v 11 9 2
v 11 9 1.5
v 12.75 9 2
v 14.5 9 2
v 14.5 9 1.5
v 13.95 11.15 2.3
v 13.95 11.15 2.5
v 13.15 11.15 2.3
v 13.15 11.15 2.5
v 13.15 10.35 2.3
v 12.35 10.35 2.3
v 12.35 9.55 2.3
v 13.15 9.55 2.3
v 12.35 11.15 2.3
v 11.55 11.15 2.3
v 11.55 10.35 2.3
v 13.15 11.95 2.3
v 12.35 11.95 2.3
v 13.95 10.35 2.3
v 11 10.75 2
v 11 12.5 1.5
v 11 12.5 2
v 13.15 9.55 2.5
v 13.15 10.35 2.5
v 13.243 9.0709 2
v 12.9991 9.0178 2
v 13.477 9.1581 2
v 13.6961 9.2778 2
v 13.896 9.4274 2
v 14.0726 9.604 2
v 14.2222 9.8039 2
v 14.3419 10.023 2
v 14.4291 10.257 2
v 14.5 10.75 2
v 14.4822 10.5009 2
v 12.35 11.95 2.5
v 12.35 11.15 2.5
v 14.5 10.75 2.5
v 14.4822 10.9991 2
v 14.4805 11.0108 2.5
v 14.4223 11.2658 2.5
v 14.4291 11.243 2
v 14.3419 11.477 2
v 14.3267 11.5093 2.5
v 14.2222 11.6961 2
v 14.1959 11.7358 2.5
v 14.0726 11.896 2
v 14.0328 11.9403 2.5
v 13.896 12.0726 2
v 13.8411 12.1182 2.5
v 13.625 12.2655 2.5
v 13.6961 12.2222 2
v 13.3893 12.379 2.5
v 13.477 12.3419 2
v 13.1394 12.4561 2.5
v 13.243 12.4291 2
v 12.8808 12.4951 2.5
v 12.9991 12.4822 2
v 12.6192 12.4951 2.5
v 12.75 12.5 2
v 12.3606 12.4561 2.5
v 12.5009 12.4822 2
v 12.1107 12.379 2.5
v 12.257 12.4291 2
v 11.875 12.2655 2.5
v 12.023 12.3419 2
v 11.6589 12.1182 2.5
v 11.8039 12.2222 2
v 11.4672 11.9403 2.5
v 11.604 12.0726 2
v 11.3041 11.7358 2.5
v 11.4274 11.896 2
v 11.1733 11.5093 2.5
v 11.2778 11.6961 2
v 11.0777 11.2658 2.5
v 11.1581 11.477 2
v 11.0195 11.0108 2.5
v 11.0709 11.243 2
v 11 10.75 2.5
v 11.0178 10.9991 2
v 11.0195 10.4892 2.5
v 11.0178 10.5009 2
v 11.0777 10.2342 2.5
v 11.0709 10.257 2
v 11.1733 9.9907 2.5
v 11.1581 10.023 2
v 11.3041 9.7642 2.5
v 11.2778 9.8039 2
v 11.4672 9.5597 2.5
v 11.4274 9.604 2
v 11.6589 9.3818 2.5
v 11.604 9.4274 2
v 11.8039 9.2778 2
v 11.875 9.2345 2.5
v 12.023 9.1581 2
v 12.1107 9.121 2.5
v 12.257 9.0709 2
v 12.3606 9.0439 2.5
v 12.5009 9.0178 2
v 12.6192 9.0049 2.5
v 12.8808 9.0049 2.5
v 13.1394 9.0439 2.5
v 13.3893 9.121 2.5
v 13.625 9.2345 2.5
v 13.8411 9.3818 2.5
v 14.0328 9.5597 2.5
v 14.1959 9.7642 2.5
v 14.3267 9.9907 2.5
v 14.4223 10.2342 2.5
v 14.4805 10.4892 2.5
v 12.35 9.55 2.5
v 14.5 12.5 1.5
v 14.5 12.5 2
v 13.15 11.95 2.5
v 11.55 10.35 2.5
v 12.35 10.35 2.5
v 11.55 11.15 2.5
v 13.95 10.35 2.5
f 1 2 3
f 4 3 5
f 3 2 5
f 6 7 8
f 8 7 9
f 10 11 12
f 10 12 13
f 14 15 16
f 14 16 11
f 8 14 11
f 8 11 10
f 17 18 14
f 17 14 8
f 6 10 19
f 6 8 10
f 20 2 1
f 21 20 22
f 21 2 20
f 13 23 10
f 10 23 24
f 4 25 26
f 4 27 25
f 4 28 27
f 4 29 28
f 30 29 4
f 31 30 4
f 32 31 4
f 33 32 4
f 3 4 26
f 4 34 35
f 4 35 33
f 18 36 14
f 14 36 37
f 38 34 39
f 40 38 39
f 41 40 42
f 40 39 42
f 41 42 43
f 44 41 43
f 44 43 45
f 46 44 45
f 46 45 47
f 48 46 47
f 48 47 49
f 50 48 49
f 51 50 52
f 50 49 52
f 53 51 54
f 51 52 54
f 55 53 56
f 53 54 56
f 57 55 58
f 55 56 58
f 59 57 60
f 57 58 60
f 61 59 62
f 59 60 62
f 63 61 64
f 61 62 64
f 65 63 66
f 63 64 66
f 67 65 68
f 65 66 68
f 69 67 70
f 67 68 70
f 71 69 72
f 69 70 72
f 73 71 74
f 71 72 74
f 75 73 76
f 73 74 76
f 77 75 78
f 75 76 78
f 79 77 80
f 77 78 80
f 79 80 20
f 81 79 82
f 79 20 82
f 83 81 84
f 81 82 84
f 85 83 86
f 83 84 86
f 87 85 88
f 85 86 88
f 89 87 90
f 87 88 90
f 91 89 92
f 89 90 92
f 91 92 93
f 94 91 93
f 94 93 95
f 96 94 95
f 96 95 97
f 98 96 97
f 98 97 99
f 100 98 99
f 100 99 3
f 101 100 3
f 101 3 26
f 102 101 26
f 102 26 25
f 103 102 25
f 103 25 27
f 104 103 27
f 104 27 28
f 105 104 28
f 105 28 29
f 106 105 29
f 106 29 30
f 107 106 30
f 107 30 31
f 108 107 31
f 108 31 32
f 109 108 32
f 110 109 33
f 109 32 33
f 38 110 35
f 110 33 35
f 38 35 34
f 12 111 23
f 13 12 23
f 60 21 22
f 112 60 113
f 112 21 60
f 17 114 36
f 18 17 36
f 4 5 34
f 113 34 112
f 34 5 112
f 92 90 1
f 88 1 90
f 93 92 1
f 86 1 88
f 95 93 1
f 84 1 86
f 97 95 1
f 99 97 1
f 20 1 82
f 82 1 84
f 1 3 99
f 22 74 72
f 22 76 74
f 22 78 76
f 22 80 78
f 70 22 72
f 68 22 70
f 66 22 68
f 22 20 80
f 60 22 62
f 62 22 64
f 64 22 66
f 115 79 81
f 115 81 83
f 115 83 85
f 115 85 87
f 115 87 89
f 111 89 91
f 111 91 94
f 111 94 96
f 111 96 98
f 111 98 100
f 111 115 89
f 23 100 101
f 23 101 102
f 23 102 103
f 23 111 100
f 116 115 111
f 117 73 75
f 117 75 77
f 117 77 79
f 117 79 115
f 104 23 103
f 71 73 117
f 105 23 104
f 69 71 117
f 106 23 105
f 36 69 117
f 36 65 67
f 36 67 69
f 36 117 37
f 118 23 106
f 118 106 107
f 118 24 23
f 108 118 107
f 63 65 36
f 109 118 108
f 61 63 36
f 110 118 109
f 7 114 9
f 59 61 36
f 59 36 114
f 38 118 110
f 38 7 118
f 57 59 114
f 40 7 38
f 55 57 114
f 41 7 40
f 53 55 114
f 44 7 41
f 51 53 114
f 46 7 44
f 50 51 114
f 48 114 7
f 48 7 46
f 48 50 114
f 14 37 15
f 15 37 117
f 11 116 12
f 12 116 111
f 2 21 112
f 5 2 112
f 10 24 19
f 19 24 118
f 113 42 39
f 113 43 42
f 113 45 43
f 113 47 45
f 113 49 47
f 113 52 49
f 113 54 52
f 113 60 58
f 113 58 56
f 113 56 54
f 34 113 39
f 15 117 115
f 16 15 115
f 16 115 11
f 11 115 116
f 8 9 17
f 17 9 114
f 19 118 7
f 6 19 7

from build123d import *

# Parameters (mm, degrees)
BOX012_W        = 3.5
BOX012_H        = 3.5
BOX012_DEPTH    = 0.5
SKETCH003_R     = 1.75
PAD001_DEPTH    = 0.5
POCKET002_DEPTH = 0.2


with BuildPart() as part:
    # Box012 → Box012 (new body)
    with BuildSketch(Plane(origin=(11, 9, 1.5), x_dir=(1, 0, 0), z_dir=(0, 0, 1))):
        with Locations((1.75, 1.75)):
            Rectangle(BOX012_W, BOX012_H)
    extrude(amount=BOX012_DEPTH)

    # Sketch003 → Pad001 (new body)
    with BuildSketch(Plane(origin=(11, 9, 2), x_dir=(1, 0, 0), z_dir=(0, 0, 1))):
        with Locations((1.75, 1.75)):
            Circle(SKETCH003_R)
    extrude(amount=PAD001_DEPTH)

    # Sketch004 → Pocket002 (cut)
    with BuildSketch(Plane(origin=(11, 9, 2.5), x_dir=(1, 0, 0), z_dir=(0, 0, 1))):
        Polygon((2.15, 2.95), (1.35, 2.95), (1.35, 2.15), (0.55, 2.15), (0.55, 1.35), (1.35, 1.35), (1.35, 0.55), (2.15, 0.55), (2.15, 1.35), (2.95, 1.35), (2.95, 2.15), (2.15, 2.15), align=None)
    extrude(amount=-POCKET002_DEPTH, mode=Mode.SUBTRACT)


solid = part.part
